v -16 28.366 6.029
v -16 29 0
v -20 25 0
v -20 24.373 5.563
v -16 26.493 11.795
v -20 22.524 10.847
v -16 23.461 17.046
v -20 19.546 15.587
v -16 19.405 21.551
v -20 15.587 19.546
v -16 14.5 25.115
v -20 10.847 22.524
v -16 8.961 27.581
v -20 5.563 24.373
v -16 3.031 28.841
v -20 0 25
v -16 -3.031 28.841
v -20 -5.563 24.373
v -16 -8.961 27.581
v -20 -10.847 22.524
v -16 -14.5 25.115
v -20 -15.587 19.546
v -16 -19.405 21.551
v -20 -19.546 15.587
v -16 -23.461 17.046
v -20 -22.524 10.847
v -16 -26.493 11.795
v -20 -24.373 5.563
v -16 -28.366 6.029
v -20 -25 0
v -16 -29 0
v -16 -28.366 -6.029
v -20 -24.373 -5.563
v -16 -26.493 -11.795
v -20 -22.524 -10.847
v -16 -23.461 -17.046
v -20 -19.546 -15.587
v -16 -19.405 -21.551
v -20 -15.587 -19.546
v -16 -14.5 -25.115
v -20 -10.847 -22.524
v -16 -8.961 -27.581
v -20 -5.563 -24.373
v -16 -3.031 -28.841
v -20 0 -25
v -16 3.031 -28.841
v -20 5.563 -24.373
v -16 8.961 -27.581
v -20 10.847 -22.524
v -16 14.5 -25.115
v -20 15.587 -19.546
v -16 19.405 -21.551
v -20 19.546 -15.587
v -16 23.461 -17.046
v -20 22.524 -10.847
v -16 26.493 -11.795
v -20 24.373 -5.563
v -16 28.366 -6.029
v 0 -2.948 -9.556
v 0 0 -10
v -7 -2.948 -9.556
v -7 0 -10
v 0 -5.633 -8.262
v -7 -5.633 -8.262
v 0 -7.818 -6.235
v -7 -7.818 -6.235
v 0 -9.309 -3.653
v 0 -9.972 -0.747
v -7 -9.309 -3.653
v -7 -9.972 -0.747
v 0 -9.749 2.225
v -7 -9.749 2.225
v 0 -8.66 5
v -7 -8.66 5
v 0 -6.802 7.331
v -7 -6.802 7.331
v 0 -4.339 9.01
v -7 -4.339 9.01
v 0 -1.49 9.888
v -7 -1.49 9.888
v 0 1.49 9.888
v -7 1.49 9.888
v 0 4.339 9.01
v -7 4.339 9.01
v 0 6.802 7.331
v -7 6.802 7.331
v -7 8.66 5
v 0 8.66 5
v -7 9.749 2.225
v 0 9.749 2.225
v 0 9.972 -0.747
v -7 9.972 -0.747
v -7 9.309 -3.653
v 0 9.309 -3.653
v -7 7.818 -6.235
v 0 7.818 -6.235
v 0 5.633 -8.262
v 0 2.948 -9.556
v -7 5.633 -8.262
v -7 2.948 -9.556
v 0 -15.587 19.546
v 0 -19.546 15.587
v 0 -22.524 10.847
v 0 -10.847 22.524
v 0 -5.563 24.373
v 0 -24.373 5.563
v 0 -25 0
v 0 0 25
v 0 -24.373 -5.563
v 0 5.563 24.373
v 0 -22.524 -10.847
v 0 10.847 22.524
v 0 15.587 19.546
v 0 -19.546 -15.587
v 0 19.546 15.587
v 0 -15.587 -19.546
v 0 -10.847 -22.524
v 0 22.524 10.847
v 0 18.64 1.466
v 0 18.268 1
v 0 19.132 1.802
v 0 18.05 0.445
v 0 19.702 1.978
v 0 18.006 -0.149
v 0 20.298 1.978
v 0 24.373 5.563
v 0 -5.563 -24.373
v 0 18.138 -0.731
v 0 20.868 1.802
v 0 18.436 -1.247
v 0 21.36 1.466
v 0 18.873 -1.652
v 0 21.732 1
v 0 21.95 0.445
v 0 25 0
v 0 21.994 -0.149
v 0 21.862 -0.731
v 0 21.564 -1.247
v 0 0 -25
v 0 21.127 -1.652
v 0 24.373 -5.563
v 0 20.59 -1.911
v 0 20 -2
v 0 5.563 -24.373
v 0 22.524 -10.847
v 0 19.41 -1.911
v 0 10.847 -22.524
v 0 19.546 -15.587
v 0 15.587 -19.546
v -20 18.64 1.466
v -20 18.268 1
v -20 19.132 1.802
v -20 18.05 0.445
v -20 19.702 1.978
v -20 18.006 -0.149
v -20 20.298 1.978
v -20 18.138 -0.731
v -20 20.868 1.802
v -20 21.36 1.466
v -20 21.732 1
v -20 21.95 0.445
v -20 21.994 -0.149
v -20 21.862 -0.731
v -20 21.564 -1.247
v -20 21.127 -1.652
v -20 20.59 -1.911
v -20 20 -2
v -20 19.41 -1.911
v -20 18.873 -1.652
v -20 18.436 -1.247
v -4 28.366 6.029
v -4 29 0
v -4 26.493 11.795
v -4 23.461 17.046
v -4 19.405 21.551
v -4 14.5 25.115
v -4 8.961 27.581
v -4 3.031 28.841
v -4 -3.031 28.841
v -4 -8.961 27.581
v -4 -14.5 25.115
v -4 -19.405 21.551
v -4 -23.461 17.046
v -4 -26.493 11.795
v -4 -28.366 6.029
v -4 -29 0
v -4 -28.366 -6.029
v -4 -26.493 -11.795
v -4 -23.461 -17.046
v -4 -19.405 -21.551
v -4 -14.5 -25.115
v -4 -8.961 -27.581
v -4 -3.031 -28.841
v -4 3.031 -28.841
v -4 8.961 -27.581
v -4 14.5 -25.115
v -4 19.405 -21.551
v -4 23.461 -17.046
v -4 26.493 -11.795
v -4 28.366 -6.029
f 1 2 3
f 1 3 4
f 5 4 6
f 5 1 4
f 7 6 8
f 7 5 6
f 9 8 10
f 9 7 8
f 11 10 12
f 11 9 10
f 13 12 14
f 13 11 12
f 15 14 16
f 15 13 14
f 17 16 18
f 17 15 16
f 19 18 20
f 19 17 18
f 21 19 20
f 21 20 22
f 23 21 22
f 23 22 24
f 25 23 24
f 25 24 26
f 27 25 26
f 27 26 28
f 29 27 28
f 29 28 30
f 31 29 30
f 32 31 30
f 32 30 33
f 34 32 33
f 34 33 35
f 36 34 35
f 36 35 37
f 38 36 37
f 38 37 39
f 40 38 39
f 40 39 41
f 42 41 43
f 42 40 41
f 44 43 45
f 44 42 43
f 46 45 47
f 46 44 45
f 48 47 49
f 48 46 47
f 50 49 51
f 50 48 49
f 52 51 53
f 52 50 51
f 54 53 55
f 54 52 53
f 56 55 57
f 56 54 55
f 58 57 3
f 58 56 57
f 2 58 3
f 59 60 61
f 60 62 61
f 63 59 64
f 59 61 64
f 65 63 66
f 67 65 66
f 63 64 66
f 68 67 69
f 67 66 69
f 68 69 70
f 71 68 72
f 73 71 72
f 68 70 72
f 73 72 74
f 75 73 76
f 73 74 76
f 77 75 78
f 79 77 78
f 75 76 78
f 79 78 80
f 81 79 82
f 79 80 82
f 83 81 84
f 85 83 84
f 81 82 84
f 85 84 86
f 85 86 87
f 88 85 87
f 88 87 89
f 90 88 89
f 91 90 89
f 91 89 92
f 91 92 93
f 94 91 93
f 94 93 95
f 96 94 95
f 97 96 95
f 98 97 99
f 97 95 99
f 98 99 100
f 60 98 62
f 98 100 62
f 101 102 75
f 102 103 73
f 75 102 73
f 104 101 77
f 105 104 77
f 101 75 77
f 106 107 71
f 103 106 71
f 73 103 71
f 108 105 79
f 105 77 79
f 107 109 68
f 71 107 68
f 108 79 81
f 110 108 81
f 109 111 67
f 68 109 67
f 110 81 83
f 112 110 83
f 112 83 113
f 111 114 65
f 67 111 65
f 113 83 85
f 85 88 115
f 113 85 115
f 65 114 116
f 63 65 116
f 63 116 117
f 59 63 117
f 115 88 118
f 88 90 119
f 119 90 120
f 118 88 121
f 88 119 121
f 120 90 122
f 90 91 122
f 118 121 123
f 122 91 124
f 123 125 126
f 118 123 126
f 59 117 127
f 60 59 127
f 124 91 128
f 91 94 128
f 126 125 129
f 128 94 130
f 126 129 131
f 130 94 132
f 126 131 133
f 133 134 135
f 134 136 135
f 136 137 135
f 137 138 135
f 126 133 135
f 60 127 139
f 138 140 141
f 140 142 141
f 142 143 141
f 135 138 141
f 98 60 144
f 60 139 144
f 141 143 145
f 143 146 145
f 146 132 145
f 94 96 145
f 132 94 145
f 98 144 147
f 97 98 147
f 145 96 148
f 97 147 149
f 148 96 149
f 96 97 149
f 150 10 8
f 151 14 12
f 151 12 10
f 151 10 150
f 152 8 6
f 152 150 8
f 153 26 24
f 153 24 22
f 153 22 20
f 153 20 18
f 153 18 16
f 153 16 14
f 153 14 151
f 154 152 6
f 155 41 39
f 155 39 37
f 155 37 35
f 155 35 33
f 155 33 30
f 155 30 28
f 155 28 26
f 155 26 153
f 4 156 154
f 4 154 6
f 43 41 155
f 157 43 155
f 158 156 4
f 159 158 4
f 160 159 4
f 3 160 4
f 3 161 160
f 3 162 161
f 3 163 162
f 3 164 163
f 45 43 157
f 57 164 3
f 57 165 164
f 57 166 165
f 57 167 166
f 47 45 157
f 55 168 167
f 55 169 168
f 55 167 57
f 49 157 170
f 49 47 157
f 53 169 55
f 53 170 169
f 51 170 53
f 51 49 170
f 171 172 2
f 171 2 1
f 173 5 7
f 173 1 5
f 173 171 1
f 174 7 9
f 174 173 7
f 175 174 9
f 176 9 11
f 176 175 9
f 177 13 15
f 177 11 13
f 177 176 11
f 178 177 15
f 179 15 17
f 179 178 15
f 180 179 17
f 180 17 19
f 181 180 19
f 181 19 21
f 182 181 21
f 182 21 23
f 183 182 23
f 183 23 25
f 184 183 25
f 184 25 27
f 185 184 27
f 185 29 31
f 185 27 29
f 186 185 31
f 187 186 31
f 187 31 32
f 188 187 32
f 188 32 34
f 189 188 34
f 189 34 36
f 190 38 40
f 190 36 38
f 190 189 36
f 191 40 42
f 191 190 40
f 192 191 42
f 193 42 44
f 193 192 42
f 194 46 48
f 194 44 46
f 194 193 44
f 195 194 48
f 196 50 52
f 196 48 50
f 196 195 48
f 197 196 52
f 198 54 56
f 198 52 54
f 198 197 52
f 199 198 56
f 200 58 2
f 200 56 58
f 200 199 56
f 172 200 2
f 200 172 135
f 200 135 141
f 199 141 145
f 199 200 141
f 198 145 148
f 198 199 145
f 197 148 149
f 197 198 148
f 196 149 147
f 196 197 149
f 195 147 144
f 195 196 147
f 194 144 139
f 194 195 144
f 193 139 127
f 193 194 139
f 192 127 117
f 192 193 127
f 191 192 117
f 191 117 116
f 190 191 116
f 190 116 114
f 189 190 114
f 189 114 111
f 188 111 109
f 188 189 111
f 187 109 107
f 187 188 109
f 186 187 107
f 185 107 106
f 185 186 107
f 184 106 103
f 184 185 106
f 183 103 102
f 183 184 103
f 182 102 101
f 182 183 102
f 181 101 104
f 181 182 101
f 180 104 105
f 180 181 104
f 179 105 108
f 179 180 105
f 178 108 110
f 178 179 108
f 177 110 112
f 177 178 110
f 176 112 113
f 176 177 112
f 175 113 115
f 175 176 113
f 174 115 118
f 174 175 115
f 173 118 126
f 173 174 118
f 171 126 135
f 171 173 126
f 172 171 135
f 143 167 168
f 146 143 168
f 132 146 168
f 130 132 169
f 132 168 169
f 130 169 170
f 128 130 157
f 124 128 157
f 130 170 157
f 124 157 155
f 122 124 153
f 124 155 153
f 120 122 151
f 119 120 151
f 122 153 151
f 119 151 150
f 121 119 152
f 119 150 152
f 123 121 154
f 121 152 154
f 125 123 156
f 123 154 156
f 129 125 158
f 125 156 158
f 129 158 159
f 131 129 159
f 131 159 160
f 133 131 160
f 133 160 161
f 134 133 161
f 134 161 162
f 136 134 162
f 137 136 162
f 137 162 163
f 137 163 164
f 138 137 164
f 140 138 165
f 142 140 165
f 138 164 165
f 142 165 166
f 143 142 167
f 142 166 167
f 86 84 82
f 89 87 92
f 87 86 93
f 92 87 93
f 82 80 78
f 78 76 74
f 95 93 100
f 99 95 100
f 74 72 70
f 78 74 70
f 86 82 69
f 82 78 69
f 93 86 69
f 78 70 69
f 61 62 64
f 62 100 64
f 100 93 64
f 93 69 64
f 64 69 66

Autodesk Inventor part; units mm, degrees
ref_plane "YZ Plane" through (0, 0, 0) normal (1, 0, 0) x (0, 1, 0)
ref_plane "XZ Plane" through (0, 0, 0) normal (0, 1, 0) x (-1, 0, 0)
ref_plane "XY Plane" through (0, 0, 0) normal (0, 0, 1) x (1, 0, 0)
sketch "Эскиз4" plane through (0, 0, 0) normal (0, 0, 1) x (1, 0, 0)
  line L0 (0, 0) -> (-20, 0)
  line L1 (-20, 0) -> (-20, 25)
  line L2 (-16, 29) -> (-4, 29)
  line L3 (0, 25) -> (0, 0)
  line L4 (-4, 29) -> (0, 25)
  line L5 (-16, 29) -> (-20, 25)
  point P0 (-20, 29)
  point P1 (0, 29)
  dimension "d14" = 20
  dimension "d15" = 29
  dimension "d16" = 4
  dimension "d17" = 4
  dimension "d18" = 4
  dimension "d19" = 4
revolve "Вращение3" add sketch "Эскиз4" angle 360 about axis through (0, 0, 0) along (-1, 0, 0)
sketch "Эскиз5" plane through (0, 0, 0) normal (1, 0, 0) x (0, 0, -1)
  line L0 (0, 0) -> (0, 20) construction
  dimension "d21" = 20
hole "Отверстие1" at (0, 20, 0) direction (-1, 0, 0) diameter 4 end through all
sketch "Эскиз6" plane through (0, 0, 0) normal (1, 0, 0) x (0, 0, -1)
  point P0 (0, 0)
  point P1 (0, 0)
hole "Отверстие2" at (0, 0, 0) direction (-1, 0, 0) diameter 20 depth 7
equation "\"d17\" = d16"
equation "\"d18\" = d16"
equation "\"d19\" = d18"
properties part number "711122"
